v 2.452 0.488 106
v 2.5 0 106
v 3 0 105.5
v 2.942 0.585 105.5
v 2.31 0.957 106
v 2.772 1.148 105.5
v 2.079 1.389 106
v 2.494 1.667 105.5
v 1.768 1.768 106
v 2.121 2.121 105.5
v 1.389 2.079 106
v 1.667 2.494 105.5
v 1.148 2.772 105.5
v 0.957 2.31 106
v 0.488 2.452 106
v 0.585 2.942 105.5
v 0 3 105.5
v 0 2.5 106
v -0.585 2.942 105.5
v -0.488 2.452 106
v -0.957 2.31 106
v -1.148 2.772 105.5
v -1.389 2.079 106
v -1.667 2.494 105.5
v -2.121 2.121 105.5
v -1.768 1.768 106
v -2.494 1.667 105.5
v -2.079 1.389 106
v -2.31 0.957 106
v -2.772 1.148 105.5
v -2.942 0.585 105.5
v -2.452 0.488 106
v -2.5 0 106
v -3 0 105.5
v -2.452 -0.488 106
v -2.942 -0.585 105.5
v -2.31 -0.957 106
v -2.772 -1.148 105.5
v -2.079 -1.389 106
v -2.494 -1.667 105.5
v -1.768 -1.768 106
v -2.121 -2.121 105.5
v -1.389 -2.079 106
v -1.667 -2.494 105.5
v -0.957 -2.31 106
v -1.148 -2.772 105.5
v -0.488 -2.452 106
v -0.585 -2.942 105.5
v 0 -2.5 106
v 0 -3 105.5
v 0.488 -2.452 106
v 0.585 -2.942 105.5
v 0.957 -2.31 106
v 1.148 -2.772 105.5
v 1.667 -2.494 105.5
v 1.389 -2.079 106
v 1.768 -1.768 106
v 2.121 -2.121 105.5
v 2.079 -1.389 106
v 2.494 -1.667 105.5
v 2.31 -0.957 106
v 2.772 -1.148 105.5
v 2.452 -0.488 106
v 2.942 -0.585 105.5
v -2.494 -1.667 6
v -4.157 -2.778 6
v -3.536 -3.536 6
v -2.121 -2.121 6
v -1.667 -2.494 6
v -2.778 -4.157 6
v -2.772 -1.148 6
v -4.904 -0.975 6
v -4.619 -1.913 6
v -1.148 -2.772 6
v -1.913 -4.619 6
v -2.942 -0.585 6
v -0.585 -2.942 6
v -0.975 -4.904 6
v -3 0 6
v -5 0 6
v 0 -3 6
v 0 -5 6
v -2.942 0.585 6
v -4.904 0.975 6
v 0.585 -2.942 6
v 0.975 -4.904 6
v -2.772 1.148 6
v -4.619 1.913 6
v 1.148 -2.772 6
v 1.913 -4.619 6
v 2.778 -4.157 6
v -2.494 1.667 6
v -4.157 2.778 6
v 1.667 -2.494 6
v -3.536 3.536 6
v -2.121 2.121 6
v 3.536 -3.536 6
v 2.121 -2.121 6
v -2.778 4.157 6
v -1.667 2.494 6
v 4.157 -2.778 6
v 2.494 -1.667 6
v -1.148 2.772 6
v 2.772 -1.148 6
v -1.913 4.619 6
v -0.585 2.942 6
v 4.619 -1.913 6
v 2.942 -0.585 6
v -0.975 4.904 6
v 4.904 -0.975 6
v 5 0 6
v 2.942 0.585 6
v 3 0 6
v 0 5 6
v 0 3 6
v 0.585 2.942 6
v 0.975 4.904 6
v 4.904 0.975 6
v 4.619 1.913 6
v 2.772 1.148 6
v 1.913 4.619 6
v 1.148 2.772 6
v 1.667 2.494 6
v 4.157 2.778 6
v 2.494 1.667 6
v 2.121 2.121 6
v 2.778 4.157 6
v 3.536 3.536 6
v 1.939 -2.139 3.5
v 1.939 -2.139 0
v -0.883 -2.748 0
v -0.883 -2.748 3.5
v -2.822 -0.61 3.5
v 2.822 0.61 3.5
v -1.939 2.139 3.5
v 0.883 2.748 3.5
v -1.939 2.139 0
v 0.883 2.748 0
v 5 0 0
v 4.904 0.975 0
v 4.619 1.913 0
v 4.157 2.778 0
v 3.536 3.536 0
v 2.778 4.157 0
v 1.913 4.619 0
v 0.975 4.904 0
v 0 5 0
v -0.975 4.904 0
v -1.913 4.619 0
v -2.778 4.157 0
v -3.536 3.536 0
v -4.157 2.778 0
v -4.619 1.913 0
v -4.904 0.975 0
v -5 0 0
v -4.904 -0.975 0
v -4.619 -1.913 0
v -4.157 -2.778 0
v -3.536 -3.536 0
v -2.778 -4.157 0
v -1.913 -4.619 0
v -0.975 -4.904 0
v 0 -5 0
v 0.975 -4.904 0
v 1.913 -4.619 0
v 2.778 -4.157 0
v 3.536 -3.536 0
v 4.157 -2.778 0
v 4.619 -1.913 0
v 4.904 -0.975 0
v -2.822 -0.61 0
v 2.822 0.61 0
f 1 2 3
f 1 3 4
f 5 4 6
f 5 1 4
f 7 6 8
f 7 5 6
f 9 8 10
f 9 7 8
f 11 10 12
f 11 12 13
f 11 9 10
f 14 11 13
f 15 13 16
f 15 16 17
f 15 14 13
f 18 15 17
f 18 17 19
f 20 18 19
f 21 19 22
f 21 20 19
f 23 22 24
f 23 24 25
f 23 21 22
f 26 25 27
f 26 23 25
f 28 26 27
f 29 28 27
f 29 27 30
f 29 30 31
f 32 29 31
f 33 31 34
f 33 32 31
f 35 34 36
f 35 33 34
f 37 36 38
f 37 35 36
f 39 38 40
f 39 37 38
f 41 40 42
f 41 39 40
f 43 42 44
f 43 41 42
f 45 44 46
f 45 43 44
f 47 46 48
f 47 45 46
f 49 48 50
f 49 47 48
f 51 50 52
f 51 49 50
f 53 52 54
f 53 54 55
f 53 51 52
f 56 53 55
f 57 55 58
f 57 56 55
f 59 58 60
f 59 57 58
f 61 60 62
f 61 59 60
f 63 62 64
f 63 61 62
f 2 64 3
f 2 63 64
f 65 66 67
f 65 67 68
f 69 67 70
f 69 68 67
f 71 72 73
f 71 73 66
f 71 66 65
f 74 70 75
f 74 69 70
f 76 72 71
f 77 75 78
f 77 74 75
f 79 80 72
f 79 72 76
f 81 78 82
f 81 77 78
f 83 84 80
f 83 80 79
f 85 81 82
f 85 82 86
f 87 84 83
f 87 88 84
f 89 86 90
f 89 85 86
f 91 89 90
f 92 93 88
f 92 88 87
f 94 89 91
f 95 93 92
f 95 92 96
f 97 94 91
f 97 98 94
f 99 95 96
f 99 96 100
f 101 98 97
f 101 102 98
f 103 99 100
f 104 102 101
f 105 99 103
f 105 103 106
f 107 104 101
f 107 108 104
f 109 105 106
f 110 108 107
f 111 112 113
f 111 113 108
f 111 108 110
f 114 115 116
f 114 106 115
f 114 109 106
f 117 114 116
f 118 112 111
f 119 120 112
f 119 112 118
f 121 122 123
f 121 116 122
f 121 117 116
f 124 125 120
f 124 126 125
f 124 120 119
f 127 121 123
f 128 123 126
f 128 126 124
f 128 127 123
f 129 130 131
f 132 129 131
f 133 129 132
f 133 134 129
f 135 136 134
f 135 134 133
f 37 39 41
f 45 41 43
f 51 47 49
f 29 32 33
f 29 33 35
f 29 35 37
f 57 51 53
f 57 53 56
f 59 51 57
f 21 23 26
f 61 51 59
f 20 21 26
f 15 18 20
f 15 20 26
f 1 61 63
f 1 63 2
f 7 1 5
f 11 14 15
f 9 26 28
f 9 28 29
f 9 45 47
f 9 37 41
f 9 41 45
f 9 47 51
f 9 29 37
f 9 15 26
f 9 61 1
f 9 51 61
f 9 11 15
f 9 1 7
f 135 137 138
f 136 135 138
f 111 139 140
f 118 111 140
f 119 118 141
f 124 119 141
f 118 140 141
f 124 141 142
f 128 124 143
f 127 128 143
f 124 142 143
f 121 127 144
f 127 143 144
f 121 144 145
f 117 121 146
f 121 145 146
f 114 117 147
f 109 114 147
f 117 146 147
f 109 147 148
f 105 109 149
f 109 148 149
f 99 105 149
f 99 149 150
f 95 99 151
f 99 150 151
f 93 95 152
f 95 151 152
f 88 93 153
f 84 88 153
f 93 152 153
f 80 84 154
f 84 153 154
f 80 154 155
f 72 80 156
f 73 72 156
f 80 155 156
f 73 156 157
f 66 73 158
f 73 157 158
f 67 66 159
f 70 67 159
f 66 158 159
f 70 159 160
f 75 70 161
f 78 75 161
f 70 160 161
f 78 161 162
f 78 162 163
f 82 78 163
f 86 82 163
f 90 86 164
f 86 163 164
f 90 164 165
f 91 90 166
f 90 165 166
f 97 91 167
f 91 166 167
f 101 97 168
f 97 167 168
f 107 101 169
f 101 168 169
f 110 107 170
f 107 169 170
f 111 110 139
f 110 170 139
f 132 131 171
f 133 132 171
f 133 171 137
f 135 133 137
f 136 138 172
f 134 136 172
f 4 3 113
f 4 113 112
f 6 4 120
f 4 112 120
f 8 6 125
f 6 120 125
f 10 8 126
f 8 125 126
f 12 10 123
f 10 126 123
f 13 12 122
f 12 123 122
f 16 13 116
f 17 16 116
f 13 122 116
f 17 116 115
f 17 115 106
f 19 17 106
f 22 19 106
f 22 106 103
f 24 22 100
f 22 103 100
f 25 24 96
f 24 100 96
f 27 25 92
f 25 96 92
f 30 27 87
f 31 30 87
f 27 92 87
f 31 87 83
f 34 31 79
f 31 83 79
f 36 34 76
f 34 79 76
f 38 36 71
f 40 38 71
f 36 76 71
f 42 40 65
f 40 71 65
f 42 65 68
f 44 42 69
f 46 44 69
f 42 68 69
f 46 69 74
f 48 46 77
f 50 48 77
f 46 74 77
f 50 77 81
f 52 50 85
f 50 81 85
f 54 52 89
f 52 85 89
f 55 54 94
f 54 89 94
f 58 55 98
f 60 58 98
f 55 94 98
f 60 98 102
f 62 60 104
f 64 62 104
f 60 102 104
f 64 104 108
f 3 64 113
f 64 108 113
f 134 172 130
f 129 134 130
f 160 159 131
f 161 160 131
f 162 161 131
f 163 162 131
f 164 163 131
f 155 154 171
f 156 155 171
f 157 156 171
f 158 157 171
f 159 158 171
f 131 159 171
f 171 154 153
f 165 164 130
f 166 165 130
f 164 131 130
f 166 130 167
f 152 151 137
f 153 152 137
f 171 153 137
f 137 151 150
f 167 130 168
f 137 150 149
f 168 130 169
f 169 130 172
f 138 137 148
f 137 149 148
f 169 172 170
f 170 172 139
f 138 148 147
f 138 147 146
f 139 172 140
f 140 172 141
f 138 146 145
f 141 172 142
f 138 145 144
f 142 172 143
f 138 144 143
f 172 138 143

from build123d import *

# Parameters (mm, degrees)
ESQUISSE1_R             = 5
BOSS_EXTRU_1_DEPTH      = 6
ESQUISSE2_R             = 3
BOSS_EXTRU_2_DEPTH      = 100
CHANFREIN1_SIZE         = 0.5
ENL_V_MAT_EXTRU_1_DEPTH = 3.5


with BuildPart() as part:
    # Esquisse1 → Boss.-Extru.1 (new body)
    with BuildSketch(Plane.XY):
        Circle(ESQUISSE1_R)
    extrude(amount=BOSS_EXTRU_1_DEPTH)

    # Esquisse2 → Boss.-Extru.2 (add)
    with BuildSketch(Plane.XY.offset(6)):
        Circle(ESQUISSE2_R)
    extrude(amount=BOSS_EXTRU_2_DEPTH)

    # Chanfrein1
    chanfrein1_edges = [part.edges().sort_by_distance(p)[0] for p in [
        (-3, 0, 106),
    ]]
    chamfer(chanfrein1_edges, length=CHANFREIN1_SIZE)

    # Esquisse3 → Enlèv. mat.-Extru.1 (cut)
    with BuildSketch(Plane(origin=(0, 0, 0), x_dir=(-1, 0, 0), z_dir=(0, 0, -1))):
        Polygon((-1.938814939, -2.138768329), (0.882820236, -2.748447155), (2.821635175, -0.609678826), (1.938814939, 2.138768329), (-0.882820236, 2.748447155), (-2.821635175, 0.609678826), align=None)
    extrude(amount=-ENL_V_MAT_EXTRU_1_DEPTH, mode=Mode.SUBTRACT)


solid = part.part
